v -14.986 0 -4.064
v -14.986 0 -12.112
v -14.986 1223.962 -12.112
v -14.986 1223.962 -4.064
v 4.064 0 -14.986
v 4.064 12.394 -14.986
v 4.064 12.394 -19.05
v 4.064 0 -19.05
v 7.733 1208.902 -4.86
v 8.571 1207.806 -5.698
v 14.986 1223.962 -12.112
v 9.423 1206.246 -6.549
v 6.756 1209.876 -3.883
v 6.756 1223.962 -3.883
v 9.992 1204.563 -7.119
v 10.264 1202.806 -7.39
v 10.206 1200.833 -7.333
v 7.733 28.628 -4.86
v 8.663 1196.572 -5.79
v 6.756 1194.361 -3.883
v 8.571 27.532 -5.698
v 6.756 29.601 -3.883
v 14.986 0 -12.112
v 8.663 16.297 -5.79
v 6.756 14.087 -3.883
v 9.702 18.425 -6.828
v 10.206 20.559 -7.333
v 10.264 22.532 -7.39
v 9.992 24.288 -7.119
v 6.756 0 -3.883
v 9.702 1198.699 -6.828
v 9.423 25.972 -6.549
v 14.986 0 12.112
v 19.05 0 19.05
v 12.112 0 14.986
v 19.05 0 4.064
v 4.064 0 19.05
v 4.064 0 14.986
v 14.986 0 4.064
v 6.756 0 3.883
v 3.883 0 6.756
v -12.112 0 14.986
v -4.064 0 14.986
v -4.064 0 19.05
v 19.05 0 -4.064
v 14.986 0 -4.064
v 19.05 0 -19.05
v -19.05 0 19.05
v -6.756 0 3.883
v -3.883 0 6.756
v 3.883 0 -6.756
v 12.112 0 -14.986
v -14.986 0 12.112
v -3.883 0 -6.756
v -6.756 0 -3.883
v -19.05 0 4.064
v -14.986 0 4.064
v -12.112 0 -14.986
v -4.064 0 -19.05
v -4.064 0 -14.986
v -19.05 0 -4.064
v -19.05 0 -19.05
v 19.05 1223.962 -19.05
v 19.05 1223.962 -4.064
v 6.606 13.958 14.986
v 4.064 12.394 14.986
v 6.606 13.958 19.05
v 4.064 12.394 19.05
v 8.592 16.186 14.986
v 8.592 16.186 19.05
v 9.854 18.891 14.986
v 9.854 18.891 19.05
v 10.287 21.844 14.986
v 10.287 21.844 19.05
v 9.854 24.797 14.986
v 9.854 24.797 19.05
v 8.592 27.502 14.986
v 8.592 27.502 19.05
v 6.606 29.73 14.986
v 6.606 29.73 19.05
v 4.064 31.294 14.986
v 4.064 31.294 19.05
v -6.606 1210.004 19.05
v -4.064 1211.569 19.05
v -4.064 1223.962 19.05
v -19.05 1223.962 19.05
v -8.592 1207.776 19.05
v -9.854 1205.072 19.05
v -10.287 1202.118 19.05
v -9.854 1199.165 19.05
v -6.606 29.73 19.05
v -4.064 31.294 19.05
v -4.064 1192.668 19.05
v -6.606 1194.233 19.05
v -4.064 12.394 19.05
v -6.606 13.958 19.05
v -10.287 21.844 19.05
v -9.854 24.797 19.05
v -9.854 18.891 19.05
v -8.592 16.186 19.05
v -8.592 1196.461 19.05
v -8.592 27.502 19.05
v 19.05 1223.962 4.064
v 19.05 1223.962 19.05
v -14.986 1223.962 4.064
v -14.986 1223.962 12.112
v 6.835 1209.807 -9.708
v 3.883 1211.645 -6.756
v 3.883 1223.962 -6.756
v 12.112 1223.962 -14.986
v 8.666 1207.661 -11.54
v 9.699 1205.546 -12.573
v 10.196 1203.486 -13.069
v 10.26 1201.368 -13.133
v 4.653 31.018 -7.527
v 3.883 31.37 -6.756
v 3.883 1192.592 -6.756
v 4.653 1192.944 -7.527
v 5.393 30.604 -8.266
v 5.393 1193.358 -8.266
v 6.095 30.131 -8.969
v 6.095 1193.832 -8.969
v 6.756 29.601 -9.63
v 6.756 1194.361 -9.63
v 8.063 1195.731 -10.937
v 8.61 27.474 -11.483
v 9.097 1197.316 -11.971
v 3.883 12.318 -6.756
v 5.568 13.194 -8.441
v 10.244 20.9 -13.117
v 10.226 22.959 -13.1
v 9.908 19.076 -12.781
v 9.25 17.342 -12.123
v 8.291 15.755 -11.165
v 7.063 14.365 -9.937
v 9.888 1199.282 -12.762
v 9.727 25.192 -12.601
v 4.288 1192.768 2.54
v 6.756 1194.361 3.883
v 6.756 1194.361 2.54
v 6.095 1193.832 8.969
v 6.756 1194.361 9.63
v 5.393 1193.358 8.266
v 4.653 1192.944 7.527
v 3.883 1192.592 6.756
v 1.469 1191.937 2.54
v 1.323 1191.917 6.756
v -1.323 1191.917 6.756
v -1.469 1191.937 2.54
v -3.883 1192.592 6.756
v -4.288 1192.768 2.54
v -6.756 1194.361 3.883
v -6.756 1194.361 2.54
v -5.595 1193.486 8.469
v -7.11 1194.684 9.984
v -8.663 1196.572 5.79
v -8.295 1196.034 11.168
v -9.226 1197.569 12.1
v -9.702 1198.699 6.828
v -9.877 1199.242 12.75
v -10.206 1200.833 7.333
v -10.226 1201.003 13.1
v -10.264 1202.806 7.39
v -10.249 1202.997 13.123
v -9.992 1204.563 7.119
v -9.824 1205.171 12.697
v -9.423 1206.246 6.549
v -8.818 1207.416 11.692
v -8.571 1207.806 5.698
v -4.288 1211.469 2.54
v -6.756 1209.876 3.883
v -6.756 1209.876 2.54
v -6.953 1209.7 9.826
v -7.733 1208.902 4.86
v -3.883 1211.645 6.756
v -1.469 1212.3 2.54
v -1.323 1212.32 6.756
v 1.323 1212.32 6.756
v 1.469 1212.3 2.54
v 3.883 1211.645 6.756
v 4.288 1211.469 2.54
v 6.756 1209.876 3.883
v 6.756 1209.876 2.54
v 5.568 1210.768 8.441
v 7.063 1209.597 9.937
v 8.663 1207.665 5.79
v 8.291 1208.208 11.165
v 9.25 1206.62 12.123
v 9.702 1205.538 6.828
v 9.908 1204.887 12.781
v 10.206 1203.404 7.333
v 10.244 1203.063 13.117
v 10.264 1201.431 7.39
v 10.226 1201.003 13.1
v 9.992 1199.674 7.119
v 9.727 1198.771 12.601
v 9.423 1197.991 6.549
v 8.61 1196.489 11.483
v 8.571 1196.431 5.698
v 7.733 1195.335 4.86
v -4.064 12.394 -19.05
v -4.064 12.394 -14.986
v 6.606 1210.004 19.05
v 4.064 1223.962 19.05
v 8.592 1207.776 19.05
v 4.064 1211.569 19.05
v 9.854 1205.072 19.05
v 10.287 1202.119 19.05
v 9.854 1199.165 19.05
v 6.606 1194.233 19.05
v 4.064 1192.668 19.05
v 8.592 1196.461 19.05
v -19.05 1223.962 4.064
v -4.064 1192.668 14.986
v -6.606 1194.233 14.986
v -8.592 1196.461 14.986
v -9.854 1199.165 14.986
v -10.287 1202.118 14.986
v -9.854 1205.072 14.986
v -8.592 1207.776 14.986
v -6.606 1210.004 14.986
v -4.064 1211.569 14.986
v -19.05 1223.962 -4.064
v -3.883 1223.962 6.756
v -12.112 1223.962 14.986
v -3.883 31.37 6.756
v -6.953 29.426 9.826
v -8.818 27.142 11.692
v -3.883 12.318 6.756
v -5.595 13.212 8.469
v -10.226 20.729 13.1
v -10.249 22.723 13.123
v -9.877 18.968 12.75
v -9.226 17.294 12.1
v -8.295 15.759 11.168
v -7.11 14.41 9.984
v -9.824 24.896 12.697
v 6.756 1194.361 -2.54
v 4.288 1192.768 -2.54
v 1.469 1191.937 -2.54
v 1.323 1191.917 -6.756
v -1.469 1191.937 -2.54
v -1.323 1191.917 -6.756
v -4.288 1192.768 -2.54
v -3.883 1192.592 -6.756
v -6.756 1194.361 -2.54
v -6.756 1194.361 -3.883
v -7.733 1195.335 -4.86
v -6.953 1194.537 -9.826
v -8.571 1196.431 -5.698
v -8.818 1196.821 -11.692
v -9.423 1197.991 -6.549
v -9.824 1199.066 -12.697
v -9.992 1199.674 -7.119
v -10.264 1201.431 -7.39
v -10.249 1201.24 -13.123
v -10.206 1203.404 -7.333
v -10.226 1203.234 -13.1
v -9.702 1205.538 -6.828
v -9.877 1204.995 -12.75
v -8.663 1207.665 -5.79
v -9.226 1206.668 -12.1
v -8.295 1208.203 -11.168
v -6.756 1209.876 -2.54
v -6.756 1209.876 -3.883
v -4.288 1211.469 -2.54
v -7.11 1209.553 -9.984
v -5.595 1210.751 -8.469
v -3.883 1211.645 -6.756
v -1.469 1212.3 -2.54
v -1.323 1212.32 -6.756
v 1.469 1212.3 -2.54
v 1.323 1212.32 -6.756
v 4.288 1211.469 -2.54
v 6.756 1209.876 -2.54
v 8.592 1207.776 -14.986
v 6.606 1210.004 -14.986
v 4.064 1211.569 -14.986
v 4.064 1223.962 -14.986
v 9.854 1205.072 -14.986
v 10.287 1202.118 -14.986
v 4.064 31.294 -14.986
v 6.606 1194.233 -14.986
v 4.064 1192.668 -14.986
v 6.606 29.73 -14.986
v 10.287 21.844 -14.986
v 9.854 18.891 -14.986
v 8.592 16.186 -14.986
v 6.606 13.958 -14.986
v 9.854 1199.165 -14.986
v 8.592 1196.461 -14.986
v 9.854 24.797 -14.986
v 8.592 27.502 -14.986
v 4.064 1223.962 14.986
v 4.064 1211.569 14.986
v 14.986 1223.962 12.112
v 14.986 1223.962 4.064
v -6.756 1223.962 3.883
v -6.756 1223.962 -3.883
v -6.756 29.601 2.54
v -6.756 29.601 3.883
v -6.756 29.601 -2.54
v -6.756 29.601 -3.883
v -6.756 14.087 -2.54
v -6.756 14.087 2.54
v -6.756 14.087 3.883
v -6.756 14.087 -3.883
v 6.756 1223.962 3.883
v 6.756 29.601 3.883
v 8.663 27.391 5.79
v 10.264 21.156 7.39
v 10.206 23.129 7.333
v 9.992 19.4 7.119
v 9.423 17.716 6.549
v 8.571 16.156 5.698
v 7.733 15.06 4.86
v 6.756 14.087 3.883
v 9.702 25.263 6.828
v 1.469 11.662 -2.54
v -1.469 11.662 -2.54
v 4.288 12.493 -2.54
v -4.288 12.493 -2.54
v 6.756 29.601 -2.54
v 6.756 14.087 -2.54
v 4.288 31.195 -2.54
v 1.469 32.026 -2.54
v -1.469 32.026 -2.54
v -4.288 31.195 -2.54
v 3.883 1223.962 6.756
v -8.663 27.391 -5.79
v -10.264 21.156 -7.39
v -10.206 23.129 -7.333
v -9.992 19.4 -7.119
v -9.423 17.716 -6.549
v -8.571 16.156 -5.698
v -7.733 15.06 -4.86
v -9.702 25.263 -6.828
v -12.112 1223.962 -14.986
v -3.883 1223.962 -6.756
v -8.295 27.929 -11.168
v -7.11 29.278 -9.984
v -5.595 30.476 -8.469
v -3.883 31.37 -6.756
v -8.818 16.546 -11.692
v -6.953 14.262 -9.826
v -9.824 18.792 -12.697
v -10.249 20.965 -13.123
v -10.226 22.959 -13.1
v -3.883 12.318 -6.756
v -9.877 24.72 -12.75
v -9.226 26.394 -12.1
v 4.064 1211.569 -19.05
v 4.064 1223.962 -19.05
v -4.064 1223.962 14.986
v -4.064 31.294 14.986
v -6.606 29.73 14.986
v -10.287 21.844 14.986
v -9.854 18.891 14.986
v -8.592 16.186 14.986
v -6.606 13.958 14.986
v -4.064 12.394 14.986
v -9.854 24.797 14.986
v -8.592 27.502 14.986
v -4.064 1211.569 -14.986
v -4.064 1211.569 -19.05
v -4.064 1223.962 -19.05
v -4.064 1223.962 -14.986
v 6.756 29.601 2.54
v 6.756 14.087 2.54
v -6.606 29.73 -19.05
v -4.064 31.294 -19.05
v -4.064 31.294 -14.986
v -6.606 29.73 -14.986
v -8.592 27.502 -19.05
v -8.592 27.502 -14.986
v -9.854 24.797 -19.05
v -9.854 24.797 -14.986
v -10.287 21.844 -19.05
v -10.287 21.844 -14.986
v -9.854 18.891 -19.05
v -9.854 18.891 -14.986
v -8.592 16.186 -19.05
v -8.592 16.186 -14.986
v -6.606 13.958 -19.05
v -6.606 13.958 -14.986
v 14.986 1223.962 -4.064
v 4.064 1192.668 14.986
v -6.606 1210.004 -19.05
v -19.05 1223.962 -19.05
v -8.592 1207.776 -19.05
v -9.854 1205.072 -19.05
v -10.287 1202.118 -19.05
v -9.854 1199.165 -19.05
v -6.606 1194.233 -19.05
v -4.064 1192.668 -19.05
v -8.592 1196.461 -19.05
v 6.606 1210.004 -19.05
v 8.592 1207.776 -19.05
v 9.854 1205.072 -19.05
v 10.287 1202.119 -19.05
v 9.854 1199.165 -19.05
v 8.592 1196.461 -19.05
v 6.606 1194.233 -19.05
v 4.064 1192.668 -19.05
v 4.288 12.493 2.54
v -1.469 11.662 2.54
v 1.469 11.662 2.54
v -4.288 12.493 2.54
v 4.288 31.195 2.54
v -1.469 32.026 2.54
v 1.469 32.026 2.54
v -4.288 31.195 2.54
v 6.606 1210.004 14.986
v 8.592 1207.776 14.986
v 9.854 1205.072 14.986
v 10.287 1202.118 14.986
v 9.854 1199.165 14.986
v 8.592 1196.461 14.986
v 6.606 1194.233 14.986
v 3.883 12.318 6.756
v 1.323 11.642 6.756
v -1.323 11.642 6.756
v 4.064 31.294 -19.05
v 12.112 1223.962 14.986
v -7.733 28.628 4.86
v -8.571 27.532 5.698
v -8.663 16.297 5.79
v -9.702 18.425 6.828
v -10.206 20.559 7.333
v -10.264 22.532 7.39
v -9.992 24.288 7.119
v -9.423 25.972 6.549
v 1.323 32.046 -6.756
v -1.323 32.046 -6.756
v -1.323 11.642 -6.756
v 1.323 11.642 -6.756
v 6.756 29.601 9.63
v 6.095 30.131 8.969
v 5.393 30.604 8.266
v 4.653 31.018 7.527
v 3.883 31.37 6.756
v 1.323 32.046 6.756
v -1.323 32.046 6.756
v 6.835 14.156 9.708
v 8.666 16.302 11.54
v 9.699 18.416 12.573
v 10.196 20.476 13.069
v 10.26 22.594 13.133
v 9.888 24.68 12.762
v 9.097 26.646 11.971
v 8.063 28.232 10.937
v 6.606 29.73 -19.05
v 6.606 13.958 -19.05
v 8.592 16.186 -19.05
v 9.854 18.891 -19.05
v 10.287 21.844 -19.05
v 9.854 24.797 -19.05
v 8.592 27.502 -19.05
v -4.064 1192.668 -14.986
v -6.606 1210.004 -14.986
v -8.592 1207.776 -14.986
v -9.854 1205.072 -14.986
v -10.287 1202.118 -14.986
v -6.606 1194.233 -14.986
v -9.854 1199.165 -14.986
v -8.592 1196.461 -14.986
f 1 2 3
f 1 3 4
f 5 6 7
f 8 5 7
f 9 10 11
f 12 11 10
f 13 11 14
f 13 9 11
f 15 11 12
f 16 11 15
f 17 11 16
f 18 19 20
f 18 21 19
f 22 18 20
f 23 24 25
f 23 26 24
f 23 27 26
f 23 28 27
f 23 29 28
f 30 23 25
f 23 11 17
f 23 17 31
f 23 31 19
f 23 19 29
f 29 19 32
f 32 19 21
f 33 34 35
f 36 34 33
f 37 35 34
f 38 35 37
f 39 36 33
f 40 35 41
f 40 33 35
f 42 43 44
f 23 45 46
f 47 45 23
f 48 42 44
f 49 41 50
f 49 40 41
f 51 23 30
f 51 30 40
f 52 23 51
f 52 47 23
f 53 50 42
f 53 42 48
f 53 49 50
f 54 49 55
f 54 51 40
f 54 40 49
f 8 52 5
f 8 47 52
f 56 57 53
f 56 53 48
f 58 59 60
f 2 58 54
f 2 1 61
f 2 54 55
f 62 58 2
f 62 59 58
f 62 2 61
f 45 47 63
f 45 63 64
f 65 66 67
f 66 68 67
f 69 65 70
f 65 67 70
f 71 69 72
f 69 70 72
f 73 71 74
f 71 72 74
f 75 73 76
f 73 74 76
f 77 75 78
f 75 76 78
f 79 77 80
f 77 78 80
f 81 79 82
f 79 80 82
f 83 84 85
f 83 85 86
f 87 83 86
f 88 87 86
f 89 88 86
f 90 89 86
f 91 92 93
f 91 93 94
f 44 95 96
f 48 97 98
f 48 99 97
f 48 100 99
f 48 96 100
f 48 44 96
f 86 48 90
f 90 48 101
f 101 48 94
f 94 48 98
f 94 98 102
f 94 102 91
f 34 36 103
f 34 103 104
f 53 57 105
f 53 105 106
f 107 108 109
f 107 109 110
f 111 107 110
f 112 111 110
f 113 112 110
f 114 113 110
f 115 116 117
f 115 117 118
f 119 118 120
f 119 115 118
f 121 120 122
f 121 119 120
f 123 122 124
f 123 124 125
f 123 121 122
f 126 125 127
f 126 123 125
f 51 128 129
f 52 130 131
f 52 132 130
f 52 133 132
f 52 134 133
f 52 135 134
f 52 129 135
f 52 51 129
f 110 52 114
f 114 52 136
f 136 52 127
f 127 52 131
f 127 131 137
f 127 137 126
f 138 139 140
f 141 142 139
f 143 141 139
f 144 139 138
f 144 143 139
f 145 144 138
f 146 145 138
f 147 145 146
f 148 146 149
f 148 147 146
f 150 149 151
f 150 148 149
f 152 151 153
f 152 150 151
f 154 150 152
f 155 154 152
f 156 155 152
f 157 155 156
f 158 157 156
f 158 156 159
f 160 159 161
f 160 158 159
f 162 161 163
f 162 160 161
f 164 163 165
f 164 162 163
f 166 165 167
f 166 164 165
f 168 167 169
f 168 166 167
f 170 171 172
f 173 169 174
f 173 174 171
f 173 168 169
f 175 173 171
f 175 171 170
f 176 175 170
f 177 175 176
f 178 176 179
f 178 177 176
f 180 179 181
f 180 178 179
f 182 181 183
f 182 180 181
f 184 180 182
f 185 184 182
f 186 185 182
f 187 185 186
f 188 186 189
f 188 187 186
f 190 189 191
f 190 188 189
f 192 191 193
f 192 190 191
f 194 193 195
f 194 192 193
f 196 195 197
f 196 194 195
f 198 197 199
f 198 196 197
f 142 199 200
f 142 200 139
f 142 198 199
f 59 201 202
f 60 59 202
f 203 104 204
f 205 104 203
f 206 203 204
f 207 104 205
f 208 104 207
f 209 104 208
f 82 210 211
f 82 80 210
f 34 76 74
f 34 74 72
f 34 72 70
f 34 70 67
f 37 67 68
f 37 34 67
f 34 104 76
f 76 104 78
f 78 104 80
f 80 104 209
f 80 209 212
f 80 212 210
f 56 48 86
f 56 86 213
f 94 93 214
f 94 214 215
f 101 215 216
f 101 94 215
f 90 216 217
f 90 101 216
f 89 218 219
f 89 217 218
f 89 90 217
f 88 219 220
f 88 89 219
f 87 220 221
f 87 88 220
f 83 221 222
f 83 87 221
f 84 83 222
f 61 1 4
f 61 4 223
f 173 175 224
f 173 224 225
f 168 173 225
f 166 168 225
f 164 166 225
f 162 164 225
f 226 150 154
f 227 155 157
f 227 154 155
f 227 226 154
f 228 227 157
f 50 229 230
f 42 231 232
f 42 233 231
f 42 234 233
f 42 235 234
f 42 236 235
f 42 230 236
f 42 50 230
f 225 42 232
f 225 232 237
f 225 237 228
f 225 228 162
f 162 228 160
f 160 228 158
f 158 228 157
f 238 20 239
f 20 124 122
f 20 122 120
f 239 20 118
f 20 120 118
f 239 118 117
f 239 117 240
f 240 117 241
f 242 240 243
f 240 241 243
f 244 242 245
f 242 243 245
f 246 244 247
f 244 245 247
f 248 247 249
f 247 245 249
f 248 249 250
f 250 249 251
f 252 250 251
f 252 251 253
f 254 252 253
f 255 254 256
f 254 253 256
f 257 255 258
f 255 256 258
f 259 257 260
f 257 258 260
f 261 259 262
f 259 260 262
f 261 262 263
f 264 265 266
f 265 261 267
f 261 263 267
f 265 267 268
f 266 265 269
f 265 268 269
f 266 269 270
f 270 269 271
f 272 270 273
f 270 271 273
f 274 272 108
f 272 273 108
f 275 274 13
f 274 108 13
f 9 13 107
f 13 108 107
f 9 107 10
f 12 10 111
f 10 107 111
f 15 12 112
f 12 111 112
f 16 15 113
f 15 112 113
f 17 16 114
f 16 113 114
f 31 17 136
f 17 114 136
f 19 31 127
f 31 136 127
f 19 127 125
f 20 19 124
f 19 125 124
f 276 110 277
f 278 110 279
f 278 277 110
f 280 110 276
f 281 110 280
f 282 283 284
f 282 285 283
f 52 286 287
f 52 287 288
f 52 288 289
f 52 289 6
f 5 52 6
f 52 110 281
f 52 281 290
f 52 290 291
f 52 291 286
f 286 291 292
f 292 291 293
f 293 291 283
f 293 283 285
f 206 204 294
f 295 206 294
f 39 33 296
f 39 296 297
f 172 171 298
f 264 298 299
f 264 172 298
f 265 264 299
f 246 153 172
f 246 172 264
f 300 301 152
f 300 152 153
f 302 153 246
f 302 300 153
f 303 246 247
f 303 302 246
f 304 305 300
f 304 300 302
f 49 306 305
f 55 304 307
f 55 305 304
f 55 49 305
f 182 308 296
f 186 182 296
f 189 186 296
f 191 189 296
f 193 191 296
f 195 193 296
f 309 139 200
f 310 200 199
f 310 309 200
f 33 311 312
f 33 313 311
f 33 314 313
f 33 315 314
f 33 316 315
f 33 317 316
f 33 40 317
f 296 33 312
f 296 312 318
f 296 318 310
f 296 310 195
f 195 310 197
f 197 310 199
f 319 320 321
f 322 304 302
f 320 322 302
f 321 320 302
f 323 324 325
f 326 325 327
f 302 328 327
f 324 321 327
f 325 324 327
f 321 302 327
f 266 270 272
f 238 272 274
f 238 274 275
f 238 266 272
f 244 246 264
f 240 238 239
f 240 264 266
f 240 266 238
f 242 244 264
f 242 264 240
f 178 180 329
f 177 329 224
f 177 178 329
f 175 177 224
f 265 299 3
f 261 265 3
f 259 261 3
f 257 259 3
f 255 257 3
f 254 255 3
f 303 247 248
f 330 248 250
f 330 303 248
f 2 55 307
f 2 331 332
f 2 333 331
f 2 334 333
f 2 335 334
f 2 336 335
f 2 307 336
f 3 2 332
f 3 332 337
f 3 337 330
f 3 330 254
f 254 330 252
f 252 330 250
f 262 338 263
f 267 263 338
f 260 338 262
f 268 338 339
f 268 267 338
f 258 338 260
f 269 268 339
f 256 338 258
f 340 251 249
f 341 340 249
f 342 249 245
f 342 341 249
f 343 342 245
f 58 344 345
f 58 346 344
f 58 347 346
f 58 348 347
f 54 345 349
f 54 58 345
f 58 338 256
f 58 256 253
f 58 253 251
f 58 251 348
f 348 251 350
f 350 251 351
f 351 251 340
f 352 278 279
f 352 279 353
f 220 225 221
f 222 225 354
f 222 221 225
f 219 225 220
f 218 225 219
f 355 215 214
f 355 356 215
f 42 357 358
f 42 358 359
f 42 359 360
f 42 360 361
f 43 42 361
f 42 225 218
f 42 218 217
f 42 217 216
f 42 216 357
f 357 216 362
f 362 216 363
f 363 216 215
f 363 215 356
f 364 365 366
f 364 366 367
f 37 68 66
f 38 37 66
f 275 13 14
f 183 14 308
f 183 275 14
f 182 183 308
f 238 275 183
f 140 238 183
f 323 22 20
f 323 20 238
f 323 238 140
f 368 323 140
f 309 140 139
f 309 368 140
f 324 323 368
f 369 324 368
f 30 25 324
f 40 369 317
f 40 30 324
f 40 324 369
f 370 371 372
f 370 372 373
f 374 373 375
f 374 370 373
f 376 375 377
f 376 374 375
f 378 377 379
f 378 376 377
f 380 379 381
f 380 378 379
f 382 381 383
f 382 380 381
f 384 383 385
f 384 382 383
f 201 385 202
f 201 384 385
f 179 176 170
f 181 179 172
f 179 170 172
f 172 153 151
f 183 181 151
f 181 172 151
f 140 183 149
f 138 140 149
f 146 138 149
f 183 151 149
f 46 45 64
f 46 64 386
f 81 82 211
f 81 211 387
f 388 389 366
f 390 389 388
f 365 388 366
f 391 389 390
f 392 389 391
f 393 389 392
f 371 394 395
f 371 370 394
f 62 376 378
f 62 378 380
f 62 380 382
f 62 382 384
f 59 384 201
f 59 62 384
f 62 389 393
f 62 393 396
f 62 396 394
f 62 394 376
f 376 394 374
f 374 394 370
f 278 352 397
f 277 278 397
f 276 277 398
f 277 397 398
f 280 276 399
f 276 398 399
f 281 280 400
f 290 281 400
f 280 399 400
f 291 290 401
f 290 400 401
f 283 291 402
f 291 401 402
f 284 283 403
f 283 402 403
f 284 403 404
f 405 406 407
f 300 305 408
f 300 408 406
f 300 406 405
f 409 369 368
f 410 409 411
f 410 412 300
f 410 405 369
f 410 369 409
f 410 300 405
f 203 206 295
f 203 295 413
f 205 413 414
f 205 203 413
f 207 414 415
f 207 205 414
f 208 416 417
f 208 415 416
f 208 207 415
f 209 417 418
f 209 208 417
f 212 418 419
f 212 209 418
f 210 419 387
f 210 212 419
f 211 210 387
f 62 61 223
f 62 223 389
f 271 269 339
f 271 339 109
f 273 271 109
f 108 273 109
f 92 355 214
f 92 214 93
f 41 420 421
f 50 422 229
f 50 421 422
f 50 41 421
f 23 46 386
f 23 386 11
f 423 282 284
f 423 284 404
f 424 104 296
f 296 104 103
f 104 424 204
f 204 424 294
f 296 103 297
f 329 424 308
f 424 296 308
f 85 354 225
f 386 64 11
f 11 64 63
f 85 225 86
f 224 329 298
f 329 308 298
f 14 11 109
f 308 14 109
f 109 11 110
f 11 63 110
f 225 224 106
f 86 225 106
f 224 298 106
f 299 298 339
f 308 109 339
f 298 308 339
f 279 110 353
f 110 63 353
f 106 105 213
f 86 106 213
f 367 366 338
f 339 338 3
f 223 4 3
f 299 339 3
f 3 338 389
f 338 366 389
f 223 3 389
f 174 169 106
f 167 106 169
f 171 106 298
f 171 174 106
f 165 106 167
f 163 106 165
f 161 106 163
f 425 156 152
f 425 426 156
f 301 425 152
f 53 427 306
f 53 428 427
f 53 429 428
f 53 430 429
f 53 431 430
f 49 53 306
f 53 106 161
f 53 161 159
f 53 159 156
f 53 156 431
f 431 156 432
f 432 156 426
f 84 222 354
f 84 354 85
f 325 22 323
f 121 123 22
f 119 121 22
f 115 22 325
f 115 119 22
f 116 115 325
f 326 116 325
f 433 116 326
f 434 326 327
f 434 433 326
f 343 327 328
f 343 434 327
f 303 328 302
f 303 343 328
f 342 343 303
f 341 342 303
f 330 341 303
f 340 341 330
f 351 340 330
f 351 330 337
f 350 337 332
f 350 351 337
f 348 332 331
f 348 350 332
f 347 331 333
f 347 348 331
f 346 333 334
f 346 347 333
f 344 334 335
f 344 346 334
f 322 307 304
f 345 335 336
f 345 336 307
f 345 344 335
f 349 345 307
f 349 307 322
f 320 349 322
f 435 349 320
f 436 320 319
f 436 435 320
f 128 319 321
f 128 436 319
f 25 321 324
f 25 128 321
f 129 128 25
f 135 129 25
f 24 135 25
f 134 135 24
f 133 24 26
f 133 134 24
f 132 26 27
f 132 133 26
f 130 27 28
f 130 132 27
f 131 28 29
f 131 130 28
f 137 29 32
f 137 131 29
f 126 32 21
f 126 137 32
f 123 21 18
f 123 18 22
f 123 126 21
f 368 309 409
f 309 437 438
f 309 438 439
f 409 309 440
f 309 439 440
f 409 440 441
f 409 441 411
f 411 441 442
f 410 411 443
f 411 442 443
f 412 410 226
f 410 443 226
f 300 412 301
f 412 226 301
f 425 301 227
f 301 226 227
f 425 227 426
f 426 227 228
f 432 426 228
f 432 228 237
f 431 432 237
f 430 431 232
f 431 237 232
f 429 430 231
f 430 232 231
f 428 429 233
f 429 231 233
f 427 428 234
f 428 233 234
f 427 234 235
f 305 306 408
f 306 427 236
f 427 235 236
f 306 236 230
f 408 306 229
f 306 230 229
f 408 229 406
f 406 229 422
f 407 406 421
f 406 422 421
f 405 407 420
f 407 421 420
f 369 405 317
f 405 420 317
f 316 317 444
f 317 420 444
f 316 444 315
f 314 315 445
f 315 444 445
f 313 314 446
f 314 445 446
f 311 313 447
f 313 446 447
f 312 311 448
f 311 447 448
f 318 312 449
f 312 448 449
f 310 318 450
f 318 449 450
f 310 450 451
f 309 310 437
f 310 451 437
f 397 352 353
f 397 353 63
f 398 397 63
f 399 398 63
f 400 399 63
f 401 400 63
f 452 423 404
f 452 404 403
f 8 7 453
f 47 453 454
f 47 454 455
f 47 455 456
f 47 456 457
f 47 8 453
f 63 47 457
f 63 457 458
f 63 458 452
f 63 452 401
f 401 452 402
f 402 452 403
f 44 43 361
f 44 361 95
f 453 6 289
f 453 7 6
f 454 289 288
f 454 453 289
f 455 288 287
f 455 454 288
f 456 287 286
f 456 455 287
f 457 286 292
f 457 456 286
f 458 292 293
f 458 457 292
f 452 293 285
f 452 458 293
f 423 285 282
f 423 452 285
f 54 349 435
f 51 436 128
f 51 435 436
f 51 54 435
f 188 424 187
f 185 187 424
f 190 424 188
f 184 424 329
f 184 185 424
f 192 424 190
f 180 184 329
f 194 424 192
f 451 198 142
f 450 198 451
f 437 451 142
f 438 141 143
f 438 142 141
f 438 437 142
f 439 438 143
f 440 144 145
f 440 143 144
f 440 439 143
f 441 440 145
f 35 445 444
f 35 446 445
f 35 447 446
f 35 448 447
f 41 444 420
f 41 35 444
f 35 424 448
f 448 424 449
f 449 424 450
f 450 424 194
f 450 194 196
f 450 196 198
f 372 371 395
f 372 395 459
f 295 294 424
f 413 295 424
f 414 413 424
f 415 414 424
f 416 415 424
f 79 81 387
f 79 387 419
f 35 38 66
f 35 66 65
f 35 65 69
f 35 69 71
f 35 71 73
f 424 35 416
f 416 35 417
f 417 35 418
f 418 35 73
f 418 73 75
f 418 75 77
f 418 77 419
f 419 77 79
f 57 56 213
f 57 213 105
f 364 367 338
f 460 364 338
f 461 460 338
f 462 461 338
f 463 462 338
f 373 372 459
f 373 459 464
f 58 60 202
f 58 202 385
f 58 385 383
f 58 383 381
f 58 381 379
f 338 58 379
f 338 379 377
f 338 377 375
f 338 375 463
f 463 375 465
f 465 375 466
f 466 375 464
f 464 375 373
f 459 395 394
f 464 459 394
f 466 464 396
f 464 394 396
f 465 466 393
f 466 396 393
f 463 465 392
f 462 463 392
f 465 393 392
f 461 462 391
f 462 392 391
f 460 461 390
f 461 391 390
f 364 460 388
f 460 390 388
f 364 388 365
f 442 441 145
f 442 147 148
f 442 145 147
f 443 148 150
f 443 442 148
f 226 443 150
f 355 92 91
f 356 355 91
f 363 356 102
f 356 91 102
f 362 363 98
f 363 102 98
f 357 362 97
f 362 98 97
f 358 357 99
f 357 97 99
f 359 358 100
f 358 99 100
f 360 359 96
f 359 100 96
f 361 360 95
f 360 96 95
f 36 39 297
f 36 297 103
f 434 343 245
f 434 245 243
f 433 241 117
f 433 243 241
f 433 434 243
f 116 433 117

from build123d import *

# Parameters (mm, degrees)
BOSS_EXTRUDE1_DEPTH     = 1223.9625
SKETCH3_R               = 10.287
CUT_EXTRUDE1_DEPTH      = 16.51
MIRROR2_COPY_1_SKETCH_R = 10.287
MIRROR2_COPY_1_DEPTH    = 16.51


with BuildPart() as part:
    # Sketch2 → Boss-Extrude1 (new body)
    with BuildSketch(Plane(origin=(0.594697292, 0, 0.594697292), x_dir=(1, 0, 0), z_dir=(0, 1, 0))):
        Polygon((-19.644697292, 19.644697292), (-4.658697292, 19.644697292), (-4.658697292, 15.580697292), (-12.707015333, 15.580697292), (-4.477415333, 7.351097292), (3.288020749, 7.351097292), (11.517620749, 15.580697292), (3.469302708, 15.580697292), (3.469302708, 19.644697292), (18.455302708, 19.644697292), (18.455302708, 4.658697292), (14.391302708, 4.658697292), (14.391302708, 12.707015333), (6.161702708, 4.477415333), (6.161702708, -3.288020749), (14.391302708, -11.517620749), (14.391302708, -3.469302708), (18.455302708, -3.469302708), (18.455302708, -18.455302708), (3.469302708, -18.455302708), (3.469302708, -14.391302708), (11.517620749, -14.391302708), (3.288020749, -6.161702708), (-4.477415333, -6.161702708), (-12.707015333, -14.391302708), (-4.658697292, -14.391302708), (-4.658697292, -18.455302708), (-19.644697292, -18.455302708), (-19.644697292, -3.469302708), (-15.580697292, -3.469302708), (-15.580697292, -11.517620749), (-7.351097292, -3.288020749), (-7.351097292, 4.477415333), (-15.580697292, 12.707015333), (-15.580697292, 4.658697292), (-19.644697292, 4.658697292), align=None)
    extrude(amount=BOSS_EXTRUDE1_DEPTH)

    # Sketch3 → Cut-Extrude1 (cut)
    with BuildSketch(Plane.XY.offset(19.05)):
        with Locations(Location((0, 21.844, 0), (0, 0, 48.944473627))):
            Circle(SKETCH3_R)
    cut_extrude1 = extrude(amount=-CUT_EXTRUDE1_DEPTH, mode=Mode.SUBTRACT)

    # Mirror1: Cut-Extrude1 across plane
    add(cut_extrude1.mirror(Plane.XY), mode=Mode.SUBTRACT)

    # Mirror2: Cut-Extrude1 across plane
    add(cut_extrude1.mirror(Plane.ZX.offset(611.98125)), mode=Mode.SUBTRACT)

    # Mirror2 copy 1 sketch → Mirror2 copy 1 (cut)
    with BuildSketch(Plane(origin=(0, 1223.9625, -19.05), x_dir=(1, 0, 0), z_dir=(0, 0, -1))):
        with Locations(Location((0, 21.844, 0), (0, 0, 48.944473627))):
            Circle(MIRROR2_COPY_1_SKETCH_R)
    extrude(amount=-MIRROR2_COPY_1_DEPTH, mode=Mode.SUBTRACT)


solid = part.part
